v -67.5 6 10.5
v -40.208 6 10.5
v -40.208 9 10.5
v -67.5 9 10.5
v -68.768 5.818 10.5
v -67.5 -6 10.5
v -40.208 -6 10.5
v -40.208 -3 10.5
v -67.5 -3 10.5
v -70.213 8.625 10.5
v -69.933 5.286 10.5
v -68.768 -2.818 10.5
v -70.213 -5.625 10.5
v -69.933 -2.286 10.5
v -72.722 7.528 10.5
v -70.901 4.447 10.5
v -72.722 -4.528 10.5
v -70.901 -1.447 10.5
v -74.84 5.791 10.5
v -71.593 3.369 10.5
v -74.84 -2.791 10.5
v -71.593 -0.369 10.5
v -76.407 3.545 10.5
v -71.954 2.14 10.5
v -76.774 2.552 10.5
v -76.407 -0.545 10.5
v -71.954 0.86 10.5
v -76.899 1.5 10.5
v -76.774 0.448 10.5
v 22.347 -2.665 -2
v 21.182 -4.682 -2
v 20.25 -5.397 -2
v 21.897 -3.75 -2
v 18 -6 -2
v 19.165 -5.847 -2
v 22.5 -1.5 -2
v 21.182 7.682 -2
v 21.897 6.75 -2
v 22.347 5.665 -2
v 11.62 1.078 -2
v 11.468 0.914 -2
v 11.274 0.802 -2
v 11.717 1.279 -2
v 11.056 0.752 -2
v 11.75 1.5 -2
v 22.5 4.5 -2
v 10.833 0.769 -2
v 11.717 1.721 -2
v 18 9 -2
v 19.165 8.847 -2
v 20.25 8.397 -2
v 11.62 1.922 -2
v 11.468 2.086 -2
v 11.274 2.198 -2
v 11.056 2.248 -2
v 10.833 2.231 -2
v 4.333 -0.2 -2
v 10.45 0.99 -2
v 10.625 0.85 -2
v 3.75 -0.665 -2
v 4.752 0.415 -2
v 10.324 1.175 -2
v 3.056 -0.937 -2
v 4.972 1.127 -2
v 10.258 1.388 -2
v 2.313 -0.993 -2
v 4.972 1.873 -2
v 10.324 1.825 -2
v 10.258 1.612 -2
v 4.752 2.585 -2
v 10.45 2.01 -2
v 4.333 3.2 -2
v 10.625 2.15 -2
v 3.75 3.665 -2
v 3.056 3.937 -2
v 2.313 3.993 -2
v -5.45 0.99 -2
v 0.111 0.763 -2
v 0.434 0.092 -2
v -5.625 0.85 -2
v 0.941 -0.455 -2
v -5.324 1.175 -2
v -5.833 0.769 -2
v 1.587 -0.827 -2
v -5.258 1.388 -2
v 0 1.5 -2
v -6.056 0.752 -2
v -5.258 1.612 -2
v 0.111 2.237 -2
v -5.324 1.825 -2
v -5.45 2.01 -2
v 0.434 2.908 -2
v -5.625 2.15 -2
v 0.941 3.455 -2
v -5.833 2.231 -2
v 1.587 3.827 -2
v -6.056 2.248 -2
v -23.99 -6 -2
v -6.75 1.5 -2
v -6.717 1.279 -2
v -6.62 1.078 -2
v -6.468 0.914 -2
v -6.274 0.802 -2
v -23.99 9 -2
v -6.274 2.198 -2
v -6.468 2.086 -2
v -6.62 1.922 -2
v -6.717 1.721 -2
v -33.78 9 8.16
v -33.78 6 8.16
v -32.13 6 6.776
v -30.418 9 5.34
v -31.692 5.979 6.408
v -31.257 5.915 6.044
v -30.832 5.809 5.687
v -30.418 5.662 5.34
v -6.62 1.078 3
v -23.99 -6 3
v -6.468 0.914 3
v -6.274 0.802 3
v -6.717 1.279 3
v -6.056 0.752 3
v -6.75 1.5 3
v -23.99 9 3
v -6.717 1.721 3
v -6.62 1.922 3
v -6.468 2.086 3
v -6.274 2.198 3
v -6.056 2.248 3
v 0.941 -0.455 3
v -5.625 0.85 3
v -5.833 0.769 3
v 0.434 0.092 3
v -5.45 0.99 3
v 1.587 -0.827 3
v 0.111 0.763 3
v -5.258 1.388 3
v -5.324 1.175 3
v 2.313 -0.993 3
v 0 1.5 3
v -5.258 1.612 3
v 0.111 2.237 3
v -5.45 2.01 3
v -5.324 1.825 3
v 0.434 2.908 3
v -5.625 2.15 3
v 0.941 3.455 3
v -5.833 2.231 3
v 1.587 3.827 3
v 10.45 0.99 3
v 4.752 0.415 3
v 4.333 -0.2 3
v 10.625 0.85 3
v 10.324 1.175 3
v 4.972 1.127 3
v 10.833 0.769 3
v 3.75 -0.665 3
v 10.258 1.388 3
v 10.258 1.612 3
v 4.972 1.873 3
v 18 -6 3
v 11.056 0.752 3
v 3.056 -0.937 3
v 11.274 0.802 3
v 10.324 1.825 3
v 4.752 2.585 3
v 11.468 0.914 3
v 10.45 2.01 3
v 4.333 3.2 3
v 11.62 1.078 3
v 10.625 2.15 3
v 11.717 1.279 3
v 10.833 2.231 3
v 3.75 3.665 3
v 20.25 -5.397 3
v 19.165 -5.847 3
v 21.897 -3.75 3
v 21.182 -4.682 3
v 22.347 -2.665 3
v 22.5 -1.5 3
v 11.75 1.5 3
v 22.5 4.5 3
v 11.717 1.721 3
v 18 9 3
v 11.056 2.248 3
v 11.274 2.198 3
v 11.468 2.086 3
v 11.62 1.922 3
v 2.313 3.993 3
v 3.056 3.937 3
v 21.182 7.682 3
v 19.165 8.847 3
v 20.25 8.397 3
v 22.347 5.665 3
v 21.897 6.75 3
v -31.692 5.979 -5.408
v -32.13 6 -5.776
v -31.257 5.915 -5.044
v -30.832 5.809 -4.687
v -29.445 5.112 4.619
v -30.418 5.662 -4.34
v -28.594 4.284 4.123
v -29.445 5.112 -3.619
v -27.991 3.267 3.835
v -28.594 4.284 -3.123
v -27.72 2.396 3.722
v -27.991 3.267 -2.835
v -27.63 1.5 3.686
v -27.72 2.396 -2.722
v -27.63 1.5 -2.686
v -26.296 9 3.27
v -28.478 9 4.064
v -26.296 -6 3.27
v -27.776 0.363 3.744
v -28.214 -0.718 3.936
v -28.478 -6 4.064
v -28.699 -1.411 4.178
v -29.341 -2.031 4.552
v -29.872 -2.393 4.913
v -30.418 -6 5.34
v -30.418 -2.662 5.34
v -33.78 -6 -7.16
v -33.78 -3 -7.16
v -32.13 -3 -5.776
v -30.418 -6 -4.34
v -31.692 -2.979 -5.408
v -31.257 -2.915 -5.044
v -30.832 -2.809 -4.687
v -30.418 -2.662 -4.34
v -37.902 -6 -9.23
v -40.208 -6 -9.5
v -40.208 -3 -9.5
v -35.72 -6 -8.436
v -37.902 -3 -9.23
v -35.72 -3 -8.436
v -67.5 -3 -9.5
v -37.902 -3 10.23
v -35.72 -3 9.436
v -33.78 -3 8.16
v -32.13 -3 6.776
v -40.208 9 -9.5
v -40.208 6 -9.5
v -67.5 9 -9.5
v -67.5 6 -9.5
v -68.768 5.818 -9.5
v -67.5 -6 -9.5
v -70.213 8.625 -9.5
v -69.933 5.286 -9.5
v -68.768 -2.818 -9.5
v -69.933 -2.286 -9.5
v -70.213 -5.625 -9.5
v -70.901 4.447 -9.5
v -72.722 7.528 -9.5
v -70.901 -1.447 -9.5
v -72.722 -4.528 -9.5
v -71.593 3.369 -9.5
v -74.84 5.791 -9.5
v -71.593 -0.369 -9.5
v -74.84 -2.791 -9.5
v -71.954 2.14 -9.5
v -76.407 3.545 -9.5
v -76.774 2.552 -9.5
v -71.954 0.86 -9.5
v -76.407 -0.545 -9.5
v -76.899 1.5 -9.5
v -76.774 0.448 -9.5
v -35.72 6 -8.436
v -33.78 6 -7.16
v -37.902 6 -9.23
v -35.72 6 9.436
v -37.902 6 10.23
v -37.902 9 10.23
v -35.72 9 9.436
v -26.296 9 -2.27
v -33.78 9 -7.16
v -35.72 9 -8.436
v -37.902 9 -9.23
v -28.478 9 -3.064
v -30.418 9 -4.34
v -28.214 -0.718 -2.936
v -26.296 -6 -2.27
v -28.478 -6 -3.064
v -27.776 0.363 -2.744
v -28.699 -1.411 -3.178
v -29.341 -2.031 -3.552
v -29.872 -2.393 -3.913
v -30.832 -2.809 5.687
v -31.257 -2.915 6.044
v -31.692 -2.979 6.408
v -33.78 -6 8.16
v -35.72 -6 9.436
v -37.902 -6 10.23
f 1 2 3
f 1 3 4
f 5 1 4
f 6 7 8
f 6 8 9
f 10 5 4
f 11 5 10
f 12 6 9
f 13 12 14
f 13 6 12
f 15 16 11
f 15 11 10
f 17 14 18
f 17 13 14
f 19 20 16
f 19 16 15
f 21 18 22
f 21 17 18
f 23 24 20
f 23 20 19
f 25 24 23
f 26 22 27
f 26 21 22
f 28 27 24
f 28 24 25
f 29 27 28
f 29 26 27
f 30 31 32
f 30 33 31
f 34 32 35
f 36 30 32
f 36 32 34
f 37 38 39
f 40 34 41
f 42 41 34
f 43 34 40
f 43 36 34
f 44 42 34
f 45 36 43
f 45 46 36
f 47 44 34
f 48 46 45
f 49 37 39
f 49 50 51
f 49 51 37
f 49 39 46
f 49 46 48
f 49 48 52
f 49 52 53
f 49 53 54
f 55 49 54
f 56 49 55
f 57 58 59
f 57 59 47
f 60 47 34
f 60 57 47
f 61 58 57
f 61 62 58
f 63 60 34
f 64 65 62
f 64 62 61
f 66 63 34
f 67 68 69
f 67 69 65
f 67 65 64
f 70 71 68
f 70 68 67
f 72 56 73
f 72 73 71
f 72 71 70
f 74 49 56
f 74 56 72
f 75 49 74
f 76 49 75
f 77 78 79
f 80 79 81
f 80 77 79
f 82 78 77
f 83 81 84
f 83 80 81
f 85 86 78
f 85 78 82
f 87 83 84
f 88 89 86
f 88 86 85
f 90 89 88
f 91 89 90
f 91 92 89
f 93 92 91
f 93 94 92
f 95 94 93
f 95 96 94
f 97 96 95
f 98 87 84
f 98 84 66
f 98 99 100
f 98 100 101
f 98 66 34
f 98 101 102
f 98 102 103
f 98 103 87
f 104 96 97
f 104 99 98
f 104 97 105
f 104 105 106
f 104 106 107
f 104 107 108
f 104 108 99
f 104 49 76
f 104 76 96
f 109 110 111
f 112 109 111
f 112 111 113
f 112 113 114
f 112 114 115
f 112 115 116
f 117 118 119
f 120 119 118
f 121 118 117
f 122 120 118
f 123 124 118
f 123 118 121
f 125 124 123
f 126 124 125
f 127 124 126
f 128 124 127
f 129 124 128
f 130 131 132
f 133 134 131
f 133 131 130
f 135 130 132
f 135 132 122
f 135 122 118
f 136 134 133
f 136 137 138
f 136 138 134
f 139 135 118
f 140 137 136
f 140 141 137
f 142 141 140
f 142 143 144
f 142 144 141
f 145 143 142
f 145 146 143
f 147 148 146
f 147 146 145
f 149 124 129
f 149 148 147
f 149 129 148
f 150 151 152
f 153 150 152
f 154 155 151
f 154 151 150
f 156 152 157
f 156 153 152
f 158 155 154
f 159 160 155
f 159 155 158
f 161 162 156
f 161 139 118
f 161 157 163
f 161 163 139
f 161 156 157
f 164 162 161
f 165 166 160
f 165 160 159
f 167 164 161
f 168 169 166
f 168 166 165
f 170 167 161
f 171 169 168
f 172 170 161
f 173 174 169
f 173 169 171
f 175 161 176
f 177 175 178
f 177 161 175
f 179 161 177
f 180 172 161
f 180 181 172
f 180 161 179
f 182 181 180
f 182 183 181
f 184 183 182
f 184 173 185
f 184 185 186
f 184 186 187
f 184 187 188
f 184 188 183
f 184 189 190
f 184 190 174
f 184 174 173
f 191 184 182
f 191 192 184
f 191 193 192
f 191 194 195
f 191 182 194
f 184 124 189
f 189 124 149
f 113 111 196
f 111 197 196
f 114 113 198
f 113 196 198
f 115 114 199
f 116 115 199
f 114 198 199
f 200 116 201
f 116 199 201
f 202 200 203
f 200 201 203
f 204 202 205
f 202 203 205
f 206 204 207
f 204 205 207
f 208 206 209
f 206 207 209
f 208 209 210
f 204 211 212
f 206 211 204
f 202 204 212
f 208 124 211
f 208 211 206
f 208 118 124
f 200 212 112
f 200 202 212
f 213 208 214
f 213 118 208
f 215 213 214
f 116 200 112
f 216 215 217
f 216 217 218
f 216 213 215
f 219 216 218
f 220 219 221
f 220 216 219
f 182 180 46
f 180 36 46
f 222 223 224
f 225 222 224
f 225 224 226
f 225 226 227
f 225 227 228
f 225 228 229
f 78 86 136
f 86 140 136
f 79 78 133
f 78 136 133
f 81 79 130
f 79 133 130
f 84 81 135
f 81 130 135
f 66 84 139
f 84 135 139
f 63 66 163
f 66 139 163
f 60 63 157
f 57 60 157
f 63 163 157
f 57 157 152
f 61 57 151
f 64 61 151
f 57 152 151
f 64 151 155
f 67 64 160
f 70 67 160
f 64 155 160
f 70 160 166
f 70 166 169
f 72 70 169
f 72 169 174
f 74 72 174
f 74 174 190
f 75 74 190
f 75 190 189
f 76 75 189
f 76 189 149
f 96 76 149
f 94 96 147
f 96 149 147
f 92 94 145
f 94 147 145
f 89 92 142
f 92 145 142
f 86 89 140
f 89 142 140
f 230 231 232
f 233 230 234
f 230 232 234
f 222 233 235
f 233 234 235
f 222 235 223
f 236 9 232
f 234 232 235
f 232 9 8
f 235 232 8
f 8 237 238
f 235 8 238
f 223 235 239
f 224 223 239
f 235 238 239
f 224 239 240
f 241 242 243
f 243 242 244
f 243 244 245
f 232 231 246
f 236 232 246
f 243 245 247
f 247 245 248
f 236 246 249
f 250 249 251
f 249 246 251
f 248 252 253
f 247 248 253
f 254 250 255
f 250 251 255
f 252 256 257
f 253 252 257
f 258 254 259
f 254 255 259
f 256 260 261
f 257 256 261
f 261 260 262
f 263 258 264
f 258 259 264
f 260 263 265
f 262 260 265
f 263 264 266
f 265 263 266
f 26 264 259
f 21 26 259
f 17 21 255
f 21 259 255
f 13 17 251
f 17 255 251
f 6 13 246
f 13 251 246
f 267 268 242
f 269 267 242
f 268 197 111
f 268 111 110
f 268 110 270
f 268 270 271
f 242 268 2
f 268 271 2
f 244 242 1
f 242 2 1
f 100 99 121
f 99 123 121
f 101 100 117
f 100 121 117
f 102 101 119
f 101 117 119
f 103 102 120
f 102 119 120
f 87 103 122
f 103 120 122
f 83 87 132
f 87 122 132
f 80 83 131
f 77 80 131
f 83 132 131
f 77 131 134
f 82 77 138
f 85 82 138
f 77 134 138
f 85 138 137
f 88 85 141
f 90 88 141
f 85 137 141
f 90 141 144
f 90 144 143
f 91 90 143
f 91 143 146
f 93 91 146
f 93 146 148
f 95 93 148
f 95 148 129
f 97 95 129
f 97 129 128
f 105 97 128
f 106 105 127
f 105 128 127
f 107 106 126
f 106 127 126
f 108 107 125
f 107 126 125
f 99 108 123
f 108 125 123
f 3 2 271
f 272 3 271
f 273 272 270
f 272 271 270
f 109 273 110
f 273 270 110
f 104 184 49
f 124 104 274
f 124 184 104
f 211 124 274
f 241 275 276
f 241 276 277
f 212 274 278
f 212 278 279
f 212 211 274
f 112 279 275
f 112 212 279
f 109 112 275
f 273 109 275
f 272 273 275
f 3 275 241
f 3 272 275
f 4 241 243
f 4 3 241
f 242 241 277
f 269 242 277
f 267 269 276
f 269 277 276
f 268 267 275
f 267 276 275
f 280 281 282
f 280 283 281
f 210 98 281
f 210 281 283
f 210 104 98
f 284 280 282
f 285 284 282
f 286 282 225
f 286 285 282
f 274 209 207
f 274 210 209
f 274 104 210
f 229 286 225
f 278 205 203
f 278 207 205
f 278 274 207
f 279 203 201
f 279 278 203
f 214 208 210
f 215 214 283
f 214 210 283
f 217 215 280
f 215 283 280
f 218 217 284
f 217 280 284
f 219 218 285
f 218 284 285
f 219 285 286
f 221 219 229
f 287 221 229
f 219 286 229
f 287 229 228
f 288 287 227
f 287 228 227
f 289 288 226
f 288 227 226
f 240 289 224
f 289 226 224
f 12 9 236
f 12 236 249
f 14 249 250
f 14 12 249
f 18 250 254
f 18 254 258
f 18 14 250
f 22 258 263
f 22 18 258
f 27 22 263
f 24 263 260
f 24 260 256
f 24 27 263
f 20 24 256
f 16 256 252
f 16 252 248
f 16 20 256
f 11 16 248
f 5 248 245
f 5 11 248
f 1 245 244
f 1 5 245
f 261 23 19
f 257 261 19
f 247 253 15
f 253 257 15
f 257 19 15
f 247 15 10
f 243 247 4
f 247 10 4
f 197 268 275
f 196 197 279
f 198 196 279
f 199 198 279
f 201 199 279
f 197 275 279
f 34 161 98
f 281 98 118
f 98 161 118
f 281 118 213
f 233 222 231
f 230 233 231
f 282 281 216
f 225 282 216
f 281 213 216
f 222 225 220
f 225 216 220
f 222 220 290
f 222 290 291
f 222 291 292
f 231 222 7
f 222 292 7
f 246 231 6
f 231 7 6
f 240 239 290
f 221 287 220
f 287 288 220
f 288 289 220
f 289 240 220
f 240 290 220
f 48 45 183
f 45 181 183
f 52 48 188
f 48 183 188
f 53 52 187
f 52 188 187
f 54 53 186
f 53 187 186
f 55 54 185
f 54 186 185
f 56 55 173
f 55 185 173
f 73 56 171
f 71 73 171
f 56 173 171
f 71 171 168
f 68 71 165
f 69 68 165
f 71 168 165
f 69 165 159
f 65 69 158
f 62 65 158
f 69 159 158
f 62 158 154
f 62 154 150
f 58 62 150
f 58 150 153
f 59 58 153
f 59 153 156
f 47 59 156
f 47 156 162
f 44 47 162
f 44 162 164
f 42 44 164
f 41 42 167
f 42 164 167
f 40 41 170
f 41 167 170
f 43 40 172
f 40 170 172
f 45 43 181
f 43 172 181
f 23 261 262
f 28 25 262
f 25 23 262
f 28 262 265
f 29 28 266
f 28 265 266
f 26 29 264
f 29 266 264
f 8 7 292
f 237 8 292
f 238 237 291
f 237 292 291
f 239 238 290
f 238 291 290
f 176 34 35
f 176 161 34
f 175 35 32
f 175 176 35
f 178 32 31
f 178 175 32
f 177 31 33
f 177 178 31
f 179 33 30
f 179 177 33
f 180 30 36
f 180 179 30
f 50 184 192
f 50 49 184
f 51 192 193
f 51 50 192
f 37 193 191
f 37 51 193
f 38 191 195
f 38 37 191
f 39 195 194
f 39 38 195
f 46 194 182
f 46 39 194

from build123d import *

# Parameters (mm, degrees)
ESBO_O1_W                         = 40
ESBO_O1_H                         = 15
RESSALTO_EXTRUS_O1_DEPTH          = 3
ESBO_O3_W                         = 40
ESBO_O3_H                         = 15
RESSALTO_EXTRUS_O2_DEPTH          = 2
CORTE_EXTRUS_O1_REACH             = 26.418
ESBO_O2_R                         = 2.5
ESBO_O2_R_2                       = 0.75
CORTE_EXTRUS_O1_DIRECTION_2_REACH = 26.418
ESBO_O5_W                         = 20
ESBO_O5_H                         = 15
RESSALTO_EXTRUS_O4_DEPTH          = 60
CHANFRO1_SIZE                     = 19.068057482
CHANFRO1_SIZE_2                   = 16
FILETE4_R                         = 10
ESBO_O6_W                         = 12.577854287
ESBO_O6_H                         = 9
CORTE_EXTRUS_O2_DEPTH             = 81.237970309
FILETE5_R                         = 4.5
CIRPATTERN1_COUNT                 = 2
FILLET1_R                         = 4.5


# Some blends are built 0.0001 mm under size
with BuildPart() as part:
    # Esboço1 → Ressalto-extrusão1 (new body)
    with BuildSketch(Plane.XY):
        with Locations((2.5, 1.5)):
            Rectangle(ESBO_O1_W, ESBO_O1_H)
    extrude(amount=-RESSALTO_EXTRUS_O1_DEPTH)

    # Esboço3 → Ressalto-extrusão2 (add)
    with BuildSketch(Plane.XY):
        with Locations((2.5, 1.5)):
            Rectangle(ESBO_O3_W, ESBO_O3_H)
    extrude(amount=RESSALTO_EXTRUS_O2_DEPTH)

    # Corte-extrusão1: up to this face of the body (flat: up to its plane)
    corte_extrus_o1_end = Plane(part.part.faces().sort_by_distance((2.5, 1.5, 2))[0])
    # Esboço2 → Corte-extrusão1 (cut, up to the picked face)
    with BuildSketch(Plane.XY, mode=Mode.PRIVATE) as corte_extrus_o1_sk1:
        with Locations(Location((2.5, 1.5, 0), (0, 0, 180))):
            Circle(ESBO_O2_R)
    corte_extrus_o1_tool1 = split(extrude(corte_extrus_o1_sk1.sketch, amount=CORTE_EXTRUS_O1_REACH, mode=Mode.PRIVATE), bisect_by=corte_extrus_o1_end, keep=Keep.BOTH, mode=Mode.PRIVATE)
    # Esboço2 → Corte-extrusão1 (cut, up to the picked face)
    with BuildSketch(Plane.XY, mode=Mode.PRIVATE) as corte_extrus_o1_sk2:
        with Locations(Location((-6, 1.5, 0), (0, 0, 180))):
            Circle(ESBO_O2_R_2)
    corte_extrus_o1_tool2 = split(extrude(corte_extrus_o1_sk2.sketch, amount=CORTE_EXTRUS_O1_REACH, mode=Mode.PRIVATE), bisect_by=corte_extrus_o1_end, keep=Keep.BOTH, mode=Mode.PRIVATE)
    corte_extrus_o1_1 = corte_extrus_o1_tool1.solids().sort_by(Axis((2.5, 1.5, 0), (0, 0, 1)))[0]
    add(corte_extrus_o1_1, mode=Mode.SUBTRACT)
    corte_extrus_o1_2 = corte_extrus_o1_tool2.solids().sort_by(Axis((-6, 1.5, 0), (0, 0, 1)))[0]
    add(corte_extrus_o1_2, mode=Mode.SUBTRACT)
    corte_extrus_o1 = corte_extrus_o1_1 + corte_extrus_o1_2  # Corte-extrusão1 as one shape, for the pattern or mirror that repeats it

    # Corte-extrusão1 direction 2: up to this face of the body (flat: up to its plane)
    corte_extrus_o1_direction_2_end = Plane(part.part.faces().sort_by_distance((2.5, 1.5, -3))[0])
    # Esboço2 → Corte-extrusão1 direction 2 (cut, up to the picked face)
    with BuildSketch(Plane.XY, mode=Mode.PRIVATE) as corte_extrus_o1_direction_2_sk1:
        with Locations(Location((2.5, 1.5, 0), (0, 0, 180))):
            Circle(ESBO_O2_R)
    corte_extrus_o1_direction_2_tool1 = split(extrude(corte_extrus_o1_direction_2_sk1.sketch, amount=-CORTE_EXTRUS_O1_DIRECTION_2_REACH, mode=Mode.PRIVATE), bisect_by=corte_extrus_o1_direction_2_end, keep=Keep.BOTH, mode=Mode.PRIVATE)
    # Esboço2 → Corte-extrusão1 direction 2 (cut, up to the picked face)
    with BuildSketch(Plane.XY, mode=Mode.PRIVATE) as corte_extrus_o1_direction_2_sk2:
        with Locations(Location((-6, 1.5, 0), (0, 0, 180))):
            Circle(ESBO_O2_R_2)
    corte_extrus_o1_direction_2_tool2 = split(extrude(corte_extrus_o1_direction_2_sk2.sketch, amount=-CORTE_EXTRUS_O1_DIRECTION_2_REACH, mode=Mode.PRIVATE), bisect_by=corte_extrus_o1_direction_2_end, keep=Keep.BOTH, mode=Mode.PRIVATE)
    corte_extrus_o1_direction_2_1 = corte_extrus_o1_direction_2_tool1.solids().sort_by(Axis((2.5, 1.5, 0), (0, 0, -1)))[0]
    add(corte_extrus_o1_direction_2_1, mode=Mode.SUBTRACT)
    corte_extrus_o1_direction_2_2 = corte_extrus_o1_direction_2_tool2.solids().sort_by(Axis((-6, 1.5, 0), (0, 0, -1)))[0]
    add(corte_extrus_o1_direction_2_2, mode=Mode.SUBTRACT)
    corte_extrus_o1_direction_2 = corte_extrus_o1_direction_2_1 + corte_extrus_o1_direction_2_2  # Corte-extrusão1 direction 2 as one shape, for the pattern or mirror that repeats it

    # Esboço5 → Ressalto-extrusão4 (add)
    with BuildSketch(Plane.ZY.offset(17.5)):
        with Locations((-0.5, 1.5)):
            Rectangle(ESBO_O5_W, ESBO_O5_H)
    extrude(amount=RESSALTO_EXTRUS_O4_DEPTH)

    # Chanfro1
    # the kernel refuses this chamfer: 19.068057482, 16 mm, written as the material it takes off along each edge
    with BuildSketch(Plane(origin=(-17.5, 58.146127732, -10.5), x_dir=(-0.9996889667359941, 0, -0.024939322090234247), z_dir=(0, -1, 0))) as chanfro1_piece_1_section:
        Polygon((CHANFRO1_SIZE * 0.99968896671, -CHANFRO1_SIZE * 0.0249393220896), (-CHANFRO1_SIZE_2 * 0.0249393220902, -CHANFRO1_SIZE_2 * 0.999688966736), (0, 0), align=None)
    chanfro1_piece_1 = extrude(amount=113.292255464, mode=Mode.PRIVATE)
    chanfro1_piece_1 = split(chanfro1_piece_1, bisect_by=Plane(origin=(-25.155035178, 1.5, -3), z_dir=(0, 0, -1)), keep=Keep.TOP, mode=Mode.PRIVATE)
    add(chanfro1_piece_1, mode=Mode.SUBTRACT)
    with BuildSketch(Plane(origin=(-17.5, 58.146127732, -10.5), x_dir=(-0.9996889667359941, 0, -0.024939322090234247), z_dir=(0, -1, 0))) as chanfro1_piece_2_section:
        Polygon((CHANFRO1_SIZE * 0.99968896671, -CHANFRO1_SIZE * 0.0249393220896), (-CHANFRO1_SIZE_2 * 0.0249393220902, -CHANFRO1_SIZE_2 * 0.999688966736), (0, 0), align=None)
    chanfro1_piece_2 = extrude(amount=113.292255464, mode=Mode.PRIVATE)
    chanfro1_piece_2 = split(chanfro1_piece_2, bisect_by=Plane(origin=(-18.373305927, 1.5, 2), z_dir=(0, 0, 1)), keep=Keep.TOP, mode=Mode.PRIVATE)
    add(chanfro1_piece_2, mode=Mode.SUBTRACT)
    with BuildSketch(Plane(origin=(-17.5, -55.146127732, 9.5), x_dir=(-0.9996889667359941, 0, 0.024939322090234247), z_dir=(0, 1, 0))) as chanfro1_piece_3_section:
        Polygon((CHANFRO1_SIZE * 0.99968896671, -CHANFRO1_SIZE * 0.0249393220896), (-CHANFRO1_SIZE_2 * 0.0249393220902, -CHANFRO1_SIZE_2 * 0.999688966736), (0, 0), align=None)
    chanfro1_piece_3 = extrude(amount=113.292255464, mode=Mode.PRIVATE)
    chanfro1_piece_3 = split(chanfro1_piece_3, bisect_by=Plane(origin=(-25.155035178, 1.5, 2), z_dir=(0, 0, 1)), keep=Keep.TOP, mode=Mode.PRIVATE)
    add(chanfro1_piece_3, mode=Mode.SUBTRACT)
    with BuildSketch(Plane(origin=(-17.5, -55.146127732, 9.5), x_dir=(-0.9996889667359941, 0, 0.024939322090234247), z_dir=(0, 1, 0))) as chanfro1_piece_4_section:
        Polygon((CHANFRO1_SIZE * 0.99968896671, -CHANFRO1_SIZE * 0.0249393220896), (-CHANFRO1_SIZE_2 * 0.0249393220902, -CHANFRO1_SIZE_2 * 0.999688966736), (0, 0), align=None)
    chanfro1_piece_4 = extrude(amount=113.292255464, mode=Mode.PRIVATE)
    chanfro1_piece_4 = split(chanfro1_piece_4, bisect_by=Plane(origin=(-18.373305927, 1.5, -3), z_dir=(0, 0, -1)), keep=Keep.TOP, mode=Mode.PRIVATE)
    add(chanfro1_piece_4, mode=Mode.SUBTRACT)

    # Filete4
    # the kernel refuses this fillet: 10 mm, written as the material it adds along each edge
    with BuildSketch(Plane(origin=(-27.629905537, 9, -3), x_dir=(1, 0, 0), z_dir=(0, -1, 0)), Plane(origin=(-27.629905537, -6, 2), x_dir=(1, 0, 0), z_dir=(0, 1, 0))) as filete4_piece_1:
        with BuildLine():
            CenterArc((FILETE4_R * 0.363970234266, -FILETE4_R), FILETE4_R, 90, 40)
            Line((-FILETE4_R * 0.27881737542, -FILETE4_R * 0.233955556881), (0, 0))
            Line((0, 0), (FILETE4_R * 0.363970234266, 0))
        make_face()
    extrude(amount=15)
    # the kernel refuses this fillet: 10 mm, written as the material it takes off along each edge
    with BuildSketch(Plane(origin=(-77.5, 9, 34.5), x_dir=(0, -1, 0), z_dir=(0, 0, -1))) as filete4_2_piece_1:
        with BuildLine():
            CenterArc((FILETE4_R, -FILETE4_R), FILETE4_R, 90, 90)
            Line((0, -FILETE4_R), (0, 0))
            Line((0, 0), (FILETE4_R, 0))
        make_face()
    extrude(amount=70, mode=Mode.SUBTRACT)
    with BuildSketch(Plane(origin=(-77.5, -6, -35.5), x_dir=(1, 0, 0), z_dir=(0, 0, 1))) as filete4_2_piece_2:
        with BuildLine():
            CenterArc((FILETE4_R, FILETE4_R), FILETE4_R, 180, 90)
            Line((0, FILETE4_R), (0, 0))
            Line((0, 0), (FILETE4_R, 0))
        make_face()
    extrude(amount=70, mode=Mode.SUBTRACT)
    with BuildSketch(Plane(origin=(-36.568057482, 18.099255857, -10.5), x_dir=(0.7660444431190706, 0, 0.6427876096864291), z_dir=(0, -1, 0))) as filete4_2_piece_3:
        with BuildLine():
            CenterArc((FILETE4_R * 0.363970234266, FILETE4_R), FILETE4_R, 230, 40)
            Line((-FILETE4_R * 0.27881737542, FILETE4_R * 0.233955556881), (0, 0))
            Line((0, 0), (FILETE4_R * 0.363970234266, 0))
        make_face()
    extrude(amount=33.198511713, mode=Mode.SUBTRACT)
    with BuildSketch(Plane(origin=(-36.568057482, -15.099255857, 9.5), x_dir=(-1, 0, 0), z_dir=(0, 1, 0))) as filete4_2_piece_4:
        with BuildLine():
            CenterArc((FILETE4_R * 0.363970234266, -FILETE4_R), FILETE4_R, 90, 40)
            Line((-FILETE4_R * 0.27881737542, -FILETE4_R * 0.233955556881), (0, 0))
            Line((0, 0), (FILETE4_R * 0.363970234266, 0))
        make_face()
    extrude(amount=33.198511713, mode=Mode.SUBTRACT)

    # Esboço6 → Corte-extrusão2 (cut, through all)
    with BuildSketch(Plane.XY.offset(9.5)):
        with BuildLine():
            Line((-40.207759824, 6), (-43.207759824, 6))
            Line((-43.207759824, 6), (-67.5, 6))
            ThreePointArc((-67.5, 6), (-71.468626967, 4.766281297), (-74.038348415, 1.5))
            ThreePointArc((-74.038348415, 1.5), (-71.468626967, -1.766281297), (-67.5, -3))
            Line((-67.5, -3), (-43.207759824, -3))
            Line((-43.207759824, -3), (-40.207759824, -3))
            Line((-40.207759824, -3), (-40.207759824, 6))
        make_face()
        with Locations((-33.918832681, 1.5)):
            Rectangle(ESBO_O6_W, ESBO_O6_H)
    extrude(amount=-CORTE_EXTRUS_O2_DEPTH, mode=Mode.SUBTRACT)

    # Filete5
    filete5_edges = [part.edges().sort_by_distance(p)[0] for p in [
        (-27.629905537, -3, -0.5),
        (-27.629905537, 6, -0.5),
        (22.5, -6, -0.5),
        (22.5, 9, -0.5),
    ]]
    fillet(filete5_edges, radius=FILETE5_R - 0.0001)  # a hair under: the kernel refuses the full size

    # CirPattern1: Corte-extrusão1, Corte-extrusão1 direction 2 ×2 about axis
    cirpattern1_axis = Axis((2.5, 1.5, 0), (0, 0, 1))
    add([corte_extrus_o1.rotate(cirpattern1_axis, i * 360 / CIRPATTERN1_COUNT) for i in range(1, CIRPATTERN1_COUNT)], mode=Mode.SUBTRACT)
    add([corte_extrus_o1_direction_2.rotate(cirpattern1_axis, i * 360 / CIRPATTERN1_COUNT) for i in range(1, CIRPATTERN1_COUNT)], mode=Mode.SUBTRACT)

    # Fillet1
    # the kernel refuses this fillet: 4.5 mm, written as the material it adds along each edge
    with BuildSketch(Plane(origin=(-74.038348415, 1.5, 9.5), x_dir=(0.8237540050665563, -0.566947386568461, 0), z_dir=(0, 0, -1))) as fillet1_piece_1:
        with BuildLine():
            CenterArc((5.385987308, -3.706897217), FILLET1_R, 55.462463306, 179.999811631)
            ThreePointArc((2.834717975, -7.413786046), (0.265006635, -4.147503786), (0, 0))
            ThreePointArc((0, 0), (3.968622227, 1.233715441), (7.937244454, 0))
        make_face()
    extrude(amount=20)
    # the kernel refuses this fillet: 4.5 mm, written as the material it takes off along each edge
    with BuildSketch(Plane(origin=(-77.182458366, 1.5, -15.968577797), x_dir=(0.3543987879296305, 0.9350943797895531, 0), z_dir=(0, 0, 1))) as fillet1_2_piece_1:
        with BuildLine():
            CenterArc((1.695259117, -4.473004216), FILLET1_R, 83.720910198, 54.071383579)
            ThreePointArc((-1.63795498, -1.449813223), (-0.858738838, -0.679985448), (0, 0))
            ThreePointArc((0, 0), (1.093715559, 0.05999063), (2.187431119, 0))
        make_face()
    extrude(amount=30.937155594, mode=Mode.SUBTRACT)


with BuildPart() as part_1:
    # Body-Move/Copy2: moved
    add(part.part.moved(Location((0, 0, 1))))


solid = part_1.part
